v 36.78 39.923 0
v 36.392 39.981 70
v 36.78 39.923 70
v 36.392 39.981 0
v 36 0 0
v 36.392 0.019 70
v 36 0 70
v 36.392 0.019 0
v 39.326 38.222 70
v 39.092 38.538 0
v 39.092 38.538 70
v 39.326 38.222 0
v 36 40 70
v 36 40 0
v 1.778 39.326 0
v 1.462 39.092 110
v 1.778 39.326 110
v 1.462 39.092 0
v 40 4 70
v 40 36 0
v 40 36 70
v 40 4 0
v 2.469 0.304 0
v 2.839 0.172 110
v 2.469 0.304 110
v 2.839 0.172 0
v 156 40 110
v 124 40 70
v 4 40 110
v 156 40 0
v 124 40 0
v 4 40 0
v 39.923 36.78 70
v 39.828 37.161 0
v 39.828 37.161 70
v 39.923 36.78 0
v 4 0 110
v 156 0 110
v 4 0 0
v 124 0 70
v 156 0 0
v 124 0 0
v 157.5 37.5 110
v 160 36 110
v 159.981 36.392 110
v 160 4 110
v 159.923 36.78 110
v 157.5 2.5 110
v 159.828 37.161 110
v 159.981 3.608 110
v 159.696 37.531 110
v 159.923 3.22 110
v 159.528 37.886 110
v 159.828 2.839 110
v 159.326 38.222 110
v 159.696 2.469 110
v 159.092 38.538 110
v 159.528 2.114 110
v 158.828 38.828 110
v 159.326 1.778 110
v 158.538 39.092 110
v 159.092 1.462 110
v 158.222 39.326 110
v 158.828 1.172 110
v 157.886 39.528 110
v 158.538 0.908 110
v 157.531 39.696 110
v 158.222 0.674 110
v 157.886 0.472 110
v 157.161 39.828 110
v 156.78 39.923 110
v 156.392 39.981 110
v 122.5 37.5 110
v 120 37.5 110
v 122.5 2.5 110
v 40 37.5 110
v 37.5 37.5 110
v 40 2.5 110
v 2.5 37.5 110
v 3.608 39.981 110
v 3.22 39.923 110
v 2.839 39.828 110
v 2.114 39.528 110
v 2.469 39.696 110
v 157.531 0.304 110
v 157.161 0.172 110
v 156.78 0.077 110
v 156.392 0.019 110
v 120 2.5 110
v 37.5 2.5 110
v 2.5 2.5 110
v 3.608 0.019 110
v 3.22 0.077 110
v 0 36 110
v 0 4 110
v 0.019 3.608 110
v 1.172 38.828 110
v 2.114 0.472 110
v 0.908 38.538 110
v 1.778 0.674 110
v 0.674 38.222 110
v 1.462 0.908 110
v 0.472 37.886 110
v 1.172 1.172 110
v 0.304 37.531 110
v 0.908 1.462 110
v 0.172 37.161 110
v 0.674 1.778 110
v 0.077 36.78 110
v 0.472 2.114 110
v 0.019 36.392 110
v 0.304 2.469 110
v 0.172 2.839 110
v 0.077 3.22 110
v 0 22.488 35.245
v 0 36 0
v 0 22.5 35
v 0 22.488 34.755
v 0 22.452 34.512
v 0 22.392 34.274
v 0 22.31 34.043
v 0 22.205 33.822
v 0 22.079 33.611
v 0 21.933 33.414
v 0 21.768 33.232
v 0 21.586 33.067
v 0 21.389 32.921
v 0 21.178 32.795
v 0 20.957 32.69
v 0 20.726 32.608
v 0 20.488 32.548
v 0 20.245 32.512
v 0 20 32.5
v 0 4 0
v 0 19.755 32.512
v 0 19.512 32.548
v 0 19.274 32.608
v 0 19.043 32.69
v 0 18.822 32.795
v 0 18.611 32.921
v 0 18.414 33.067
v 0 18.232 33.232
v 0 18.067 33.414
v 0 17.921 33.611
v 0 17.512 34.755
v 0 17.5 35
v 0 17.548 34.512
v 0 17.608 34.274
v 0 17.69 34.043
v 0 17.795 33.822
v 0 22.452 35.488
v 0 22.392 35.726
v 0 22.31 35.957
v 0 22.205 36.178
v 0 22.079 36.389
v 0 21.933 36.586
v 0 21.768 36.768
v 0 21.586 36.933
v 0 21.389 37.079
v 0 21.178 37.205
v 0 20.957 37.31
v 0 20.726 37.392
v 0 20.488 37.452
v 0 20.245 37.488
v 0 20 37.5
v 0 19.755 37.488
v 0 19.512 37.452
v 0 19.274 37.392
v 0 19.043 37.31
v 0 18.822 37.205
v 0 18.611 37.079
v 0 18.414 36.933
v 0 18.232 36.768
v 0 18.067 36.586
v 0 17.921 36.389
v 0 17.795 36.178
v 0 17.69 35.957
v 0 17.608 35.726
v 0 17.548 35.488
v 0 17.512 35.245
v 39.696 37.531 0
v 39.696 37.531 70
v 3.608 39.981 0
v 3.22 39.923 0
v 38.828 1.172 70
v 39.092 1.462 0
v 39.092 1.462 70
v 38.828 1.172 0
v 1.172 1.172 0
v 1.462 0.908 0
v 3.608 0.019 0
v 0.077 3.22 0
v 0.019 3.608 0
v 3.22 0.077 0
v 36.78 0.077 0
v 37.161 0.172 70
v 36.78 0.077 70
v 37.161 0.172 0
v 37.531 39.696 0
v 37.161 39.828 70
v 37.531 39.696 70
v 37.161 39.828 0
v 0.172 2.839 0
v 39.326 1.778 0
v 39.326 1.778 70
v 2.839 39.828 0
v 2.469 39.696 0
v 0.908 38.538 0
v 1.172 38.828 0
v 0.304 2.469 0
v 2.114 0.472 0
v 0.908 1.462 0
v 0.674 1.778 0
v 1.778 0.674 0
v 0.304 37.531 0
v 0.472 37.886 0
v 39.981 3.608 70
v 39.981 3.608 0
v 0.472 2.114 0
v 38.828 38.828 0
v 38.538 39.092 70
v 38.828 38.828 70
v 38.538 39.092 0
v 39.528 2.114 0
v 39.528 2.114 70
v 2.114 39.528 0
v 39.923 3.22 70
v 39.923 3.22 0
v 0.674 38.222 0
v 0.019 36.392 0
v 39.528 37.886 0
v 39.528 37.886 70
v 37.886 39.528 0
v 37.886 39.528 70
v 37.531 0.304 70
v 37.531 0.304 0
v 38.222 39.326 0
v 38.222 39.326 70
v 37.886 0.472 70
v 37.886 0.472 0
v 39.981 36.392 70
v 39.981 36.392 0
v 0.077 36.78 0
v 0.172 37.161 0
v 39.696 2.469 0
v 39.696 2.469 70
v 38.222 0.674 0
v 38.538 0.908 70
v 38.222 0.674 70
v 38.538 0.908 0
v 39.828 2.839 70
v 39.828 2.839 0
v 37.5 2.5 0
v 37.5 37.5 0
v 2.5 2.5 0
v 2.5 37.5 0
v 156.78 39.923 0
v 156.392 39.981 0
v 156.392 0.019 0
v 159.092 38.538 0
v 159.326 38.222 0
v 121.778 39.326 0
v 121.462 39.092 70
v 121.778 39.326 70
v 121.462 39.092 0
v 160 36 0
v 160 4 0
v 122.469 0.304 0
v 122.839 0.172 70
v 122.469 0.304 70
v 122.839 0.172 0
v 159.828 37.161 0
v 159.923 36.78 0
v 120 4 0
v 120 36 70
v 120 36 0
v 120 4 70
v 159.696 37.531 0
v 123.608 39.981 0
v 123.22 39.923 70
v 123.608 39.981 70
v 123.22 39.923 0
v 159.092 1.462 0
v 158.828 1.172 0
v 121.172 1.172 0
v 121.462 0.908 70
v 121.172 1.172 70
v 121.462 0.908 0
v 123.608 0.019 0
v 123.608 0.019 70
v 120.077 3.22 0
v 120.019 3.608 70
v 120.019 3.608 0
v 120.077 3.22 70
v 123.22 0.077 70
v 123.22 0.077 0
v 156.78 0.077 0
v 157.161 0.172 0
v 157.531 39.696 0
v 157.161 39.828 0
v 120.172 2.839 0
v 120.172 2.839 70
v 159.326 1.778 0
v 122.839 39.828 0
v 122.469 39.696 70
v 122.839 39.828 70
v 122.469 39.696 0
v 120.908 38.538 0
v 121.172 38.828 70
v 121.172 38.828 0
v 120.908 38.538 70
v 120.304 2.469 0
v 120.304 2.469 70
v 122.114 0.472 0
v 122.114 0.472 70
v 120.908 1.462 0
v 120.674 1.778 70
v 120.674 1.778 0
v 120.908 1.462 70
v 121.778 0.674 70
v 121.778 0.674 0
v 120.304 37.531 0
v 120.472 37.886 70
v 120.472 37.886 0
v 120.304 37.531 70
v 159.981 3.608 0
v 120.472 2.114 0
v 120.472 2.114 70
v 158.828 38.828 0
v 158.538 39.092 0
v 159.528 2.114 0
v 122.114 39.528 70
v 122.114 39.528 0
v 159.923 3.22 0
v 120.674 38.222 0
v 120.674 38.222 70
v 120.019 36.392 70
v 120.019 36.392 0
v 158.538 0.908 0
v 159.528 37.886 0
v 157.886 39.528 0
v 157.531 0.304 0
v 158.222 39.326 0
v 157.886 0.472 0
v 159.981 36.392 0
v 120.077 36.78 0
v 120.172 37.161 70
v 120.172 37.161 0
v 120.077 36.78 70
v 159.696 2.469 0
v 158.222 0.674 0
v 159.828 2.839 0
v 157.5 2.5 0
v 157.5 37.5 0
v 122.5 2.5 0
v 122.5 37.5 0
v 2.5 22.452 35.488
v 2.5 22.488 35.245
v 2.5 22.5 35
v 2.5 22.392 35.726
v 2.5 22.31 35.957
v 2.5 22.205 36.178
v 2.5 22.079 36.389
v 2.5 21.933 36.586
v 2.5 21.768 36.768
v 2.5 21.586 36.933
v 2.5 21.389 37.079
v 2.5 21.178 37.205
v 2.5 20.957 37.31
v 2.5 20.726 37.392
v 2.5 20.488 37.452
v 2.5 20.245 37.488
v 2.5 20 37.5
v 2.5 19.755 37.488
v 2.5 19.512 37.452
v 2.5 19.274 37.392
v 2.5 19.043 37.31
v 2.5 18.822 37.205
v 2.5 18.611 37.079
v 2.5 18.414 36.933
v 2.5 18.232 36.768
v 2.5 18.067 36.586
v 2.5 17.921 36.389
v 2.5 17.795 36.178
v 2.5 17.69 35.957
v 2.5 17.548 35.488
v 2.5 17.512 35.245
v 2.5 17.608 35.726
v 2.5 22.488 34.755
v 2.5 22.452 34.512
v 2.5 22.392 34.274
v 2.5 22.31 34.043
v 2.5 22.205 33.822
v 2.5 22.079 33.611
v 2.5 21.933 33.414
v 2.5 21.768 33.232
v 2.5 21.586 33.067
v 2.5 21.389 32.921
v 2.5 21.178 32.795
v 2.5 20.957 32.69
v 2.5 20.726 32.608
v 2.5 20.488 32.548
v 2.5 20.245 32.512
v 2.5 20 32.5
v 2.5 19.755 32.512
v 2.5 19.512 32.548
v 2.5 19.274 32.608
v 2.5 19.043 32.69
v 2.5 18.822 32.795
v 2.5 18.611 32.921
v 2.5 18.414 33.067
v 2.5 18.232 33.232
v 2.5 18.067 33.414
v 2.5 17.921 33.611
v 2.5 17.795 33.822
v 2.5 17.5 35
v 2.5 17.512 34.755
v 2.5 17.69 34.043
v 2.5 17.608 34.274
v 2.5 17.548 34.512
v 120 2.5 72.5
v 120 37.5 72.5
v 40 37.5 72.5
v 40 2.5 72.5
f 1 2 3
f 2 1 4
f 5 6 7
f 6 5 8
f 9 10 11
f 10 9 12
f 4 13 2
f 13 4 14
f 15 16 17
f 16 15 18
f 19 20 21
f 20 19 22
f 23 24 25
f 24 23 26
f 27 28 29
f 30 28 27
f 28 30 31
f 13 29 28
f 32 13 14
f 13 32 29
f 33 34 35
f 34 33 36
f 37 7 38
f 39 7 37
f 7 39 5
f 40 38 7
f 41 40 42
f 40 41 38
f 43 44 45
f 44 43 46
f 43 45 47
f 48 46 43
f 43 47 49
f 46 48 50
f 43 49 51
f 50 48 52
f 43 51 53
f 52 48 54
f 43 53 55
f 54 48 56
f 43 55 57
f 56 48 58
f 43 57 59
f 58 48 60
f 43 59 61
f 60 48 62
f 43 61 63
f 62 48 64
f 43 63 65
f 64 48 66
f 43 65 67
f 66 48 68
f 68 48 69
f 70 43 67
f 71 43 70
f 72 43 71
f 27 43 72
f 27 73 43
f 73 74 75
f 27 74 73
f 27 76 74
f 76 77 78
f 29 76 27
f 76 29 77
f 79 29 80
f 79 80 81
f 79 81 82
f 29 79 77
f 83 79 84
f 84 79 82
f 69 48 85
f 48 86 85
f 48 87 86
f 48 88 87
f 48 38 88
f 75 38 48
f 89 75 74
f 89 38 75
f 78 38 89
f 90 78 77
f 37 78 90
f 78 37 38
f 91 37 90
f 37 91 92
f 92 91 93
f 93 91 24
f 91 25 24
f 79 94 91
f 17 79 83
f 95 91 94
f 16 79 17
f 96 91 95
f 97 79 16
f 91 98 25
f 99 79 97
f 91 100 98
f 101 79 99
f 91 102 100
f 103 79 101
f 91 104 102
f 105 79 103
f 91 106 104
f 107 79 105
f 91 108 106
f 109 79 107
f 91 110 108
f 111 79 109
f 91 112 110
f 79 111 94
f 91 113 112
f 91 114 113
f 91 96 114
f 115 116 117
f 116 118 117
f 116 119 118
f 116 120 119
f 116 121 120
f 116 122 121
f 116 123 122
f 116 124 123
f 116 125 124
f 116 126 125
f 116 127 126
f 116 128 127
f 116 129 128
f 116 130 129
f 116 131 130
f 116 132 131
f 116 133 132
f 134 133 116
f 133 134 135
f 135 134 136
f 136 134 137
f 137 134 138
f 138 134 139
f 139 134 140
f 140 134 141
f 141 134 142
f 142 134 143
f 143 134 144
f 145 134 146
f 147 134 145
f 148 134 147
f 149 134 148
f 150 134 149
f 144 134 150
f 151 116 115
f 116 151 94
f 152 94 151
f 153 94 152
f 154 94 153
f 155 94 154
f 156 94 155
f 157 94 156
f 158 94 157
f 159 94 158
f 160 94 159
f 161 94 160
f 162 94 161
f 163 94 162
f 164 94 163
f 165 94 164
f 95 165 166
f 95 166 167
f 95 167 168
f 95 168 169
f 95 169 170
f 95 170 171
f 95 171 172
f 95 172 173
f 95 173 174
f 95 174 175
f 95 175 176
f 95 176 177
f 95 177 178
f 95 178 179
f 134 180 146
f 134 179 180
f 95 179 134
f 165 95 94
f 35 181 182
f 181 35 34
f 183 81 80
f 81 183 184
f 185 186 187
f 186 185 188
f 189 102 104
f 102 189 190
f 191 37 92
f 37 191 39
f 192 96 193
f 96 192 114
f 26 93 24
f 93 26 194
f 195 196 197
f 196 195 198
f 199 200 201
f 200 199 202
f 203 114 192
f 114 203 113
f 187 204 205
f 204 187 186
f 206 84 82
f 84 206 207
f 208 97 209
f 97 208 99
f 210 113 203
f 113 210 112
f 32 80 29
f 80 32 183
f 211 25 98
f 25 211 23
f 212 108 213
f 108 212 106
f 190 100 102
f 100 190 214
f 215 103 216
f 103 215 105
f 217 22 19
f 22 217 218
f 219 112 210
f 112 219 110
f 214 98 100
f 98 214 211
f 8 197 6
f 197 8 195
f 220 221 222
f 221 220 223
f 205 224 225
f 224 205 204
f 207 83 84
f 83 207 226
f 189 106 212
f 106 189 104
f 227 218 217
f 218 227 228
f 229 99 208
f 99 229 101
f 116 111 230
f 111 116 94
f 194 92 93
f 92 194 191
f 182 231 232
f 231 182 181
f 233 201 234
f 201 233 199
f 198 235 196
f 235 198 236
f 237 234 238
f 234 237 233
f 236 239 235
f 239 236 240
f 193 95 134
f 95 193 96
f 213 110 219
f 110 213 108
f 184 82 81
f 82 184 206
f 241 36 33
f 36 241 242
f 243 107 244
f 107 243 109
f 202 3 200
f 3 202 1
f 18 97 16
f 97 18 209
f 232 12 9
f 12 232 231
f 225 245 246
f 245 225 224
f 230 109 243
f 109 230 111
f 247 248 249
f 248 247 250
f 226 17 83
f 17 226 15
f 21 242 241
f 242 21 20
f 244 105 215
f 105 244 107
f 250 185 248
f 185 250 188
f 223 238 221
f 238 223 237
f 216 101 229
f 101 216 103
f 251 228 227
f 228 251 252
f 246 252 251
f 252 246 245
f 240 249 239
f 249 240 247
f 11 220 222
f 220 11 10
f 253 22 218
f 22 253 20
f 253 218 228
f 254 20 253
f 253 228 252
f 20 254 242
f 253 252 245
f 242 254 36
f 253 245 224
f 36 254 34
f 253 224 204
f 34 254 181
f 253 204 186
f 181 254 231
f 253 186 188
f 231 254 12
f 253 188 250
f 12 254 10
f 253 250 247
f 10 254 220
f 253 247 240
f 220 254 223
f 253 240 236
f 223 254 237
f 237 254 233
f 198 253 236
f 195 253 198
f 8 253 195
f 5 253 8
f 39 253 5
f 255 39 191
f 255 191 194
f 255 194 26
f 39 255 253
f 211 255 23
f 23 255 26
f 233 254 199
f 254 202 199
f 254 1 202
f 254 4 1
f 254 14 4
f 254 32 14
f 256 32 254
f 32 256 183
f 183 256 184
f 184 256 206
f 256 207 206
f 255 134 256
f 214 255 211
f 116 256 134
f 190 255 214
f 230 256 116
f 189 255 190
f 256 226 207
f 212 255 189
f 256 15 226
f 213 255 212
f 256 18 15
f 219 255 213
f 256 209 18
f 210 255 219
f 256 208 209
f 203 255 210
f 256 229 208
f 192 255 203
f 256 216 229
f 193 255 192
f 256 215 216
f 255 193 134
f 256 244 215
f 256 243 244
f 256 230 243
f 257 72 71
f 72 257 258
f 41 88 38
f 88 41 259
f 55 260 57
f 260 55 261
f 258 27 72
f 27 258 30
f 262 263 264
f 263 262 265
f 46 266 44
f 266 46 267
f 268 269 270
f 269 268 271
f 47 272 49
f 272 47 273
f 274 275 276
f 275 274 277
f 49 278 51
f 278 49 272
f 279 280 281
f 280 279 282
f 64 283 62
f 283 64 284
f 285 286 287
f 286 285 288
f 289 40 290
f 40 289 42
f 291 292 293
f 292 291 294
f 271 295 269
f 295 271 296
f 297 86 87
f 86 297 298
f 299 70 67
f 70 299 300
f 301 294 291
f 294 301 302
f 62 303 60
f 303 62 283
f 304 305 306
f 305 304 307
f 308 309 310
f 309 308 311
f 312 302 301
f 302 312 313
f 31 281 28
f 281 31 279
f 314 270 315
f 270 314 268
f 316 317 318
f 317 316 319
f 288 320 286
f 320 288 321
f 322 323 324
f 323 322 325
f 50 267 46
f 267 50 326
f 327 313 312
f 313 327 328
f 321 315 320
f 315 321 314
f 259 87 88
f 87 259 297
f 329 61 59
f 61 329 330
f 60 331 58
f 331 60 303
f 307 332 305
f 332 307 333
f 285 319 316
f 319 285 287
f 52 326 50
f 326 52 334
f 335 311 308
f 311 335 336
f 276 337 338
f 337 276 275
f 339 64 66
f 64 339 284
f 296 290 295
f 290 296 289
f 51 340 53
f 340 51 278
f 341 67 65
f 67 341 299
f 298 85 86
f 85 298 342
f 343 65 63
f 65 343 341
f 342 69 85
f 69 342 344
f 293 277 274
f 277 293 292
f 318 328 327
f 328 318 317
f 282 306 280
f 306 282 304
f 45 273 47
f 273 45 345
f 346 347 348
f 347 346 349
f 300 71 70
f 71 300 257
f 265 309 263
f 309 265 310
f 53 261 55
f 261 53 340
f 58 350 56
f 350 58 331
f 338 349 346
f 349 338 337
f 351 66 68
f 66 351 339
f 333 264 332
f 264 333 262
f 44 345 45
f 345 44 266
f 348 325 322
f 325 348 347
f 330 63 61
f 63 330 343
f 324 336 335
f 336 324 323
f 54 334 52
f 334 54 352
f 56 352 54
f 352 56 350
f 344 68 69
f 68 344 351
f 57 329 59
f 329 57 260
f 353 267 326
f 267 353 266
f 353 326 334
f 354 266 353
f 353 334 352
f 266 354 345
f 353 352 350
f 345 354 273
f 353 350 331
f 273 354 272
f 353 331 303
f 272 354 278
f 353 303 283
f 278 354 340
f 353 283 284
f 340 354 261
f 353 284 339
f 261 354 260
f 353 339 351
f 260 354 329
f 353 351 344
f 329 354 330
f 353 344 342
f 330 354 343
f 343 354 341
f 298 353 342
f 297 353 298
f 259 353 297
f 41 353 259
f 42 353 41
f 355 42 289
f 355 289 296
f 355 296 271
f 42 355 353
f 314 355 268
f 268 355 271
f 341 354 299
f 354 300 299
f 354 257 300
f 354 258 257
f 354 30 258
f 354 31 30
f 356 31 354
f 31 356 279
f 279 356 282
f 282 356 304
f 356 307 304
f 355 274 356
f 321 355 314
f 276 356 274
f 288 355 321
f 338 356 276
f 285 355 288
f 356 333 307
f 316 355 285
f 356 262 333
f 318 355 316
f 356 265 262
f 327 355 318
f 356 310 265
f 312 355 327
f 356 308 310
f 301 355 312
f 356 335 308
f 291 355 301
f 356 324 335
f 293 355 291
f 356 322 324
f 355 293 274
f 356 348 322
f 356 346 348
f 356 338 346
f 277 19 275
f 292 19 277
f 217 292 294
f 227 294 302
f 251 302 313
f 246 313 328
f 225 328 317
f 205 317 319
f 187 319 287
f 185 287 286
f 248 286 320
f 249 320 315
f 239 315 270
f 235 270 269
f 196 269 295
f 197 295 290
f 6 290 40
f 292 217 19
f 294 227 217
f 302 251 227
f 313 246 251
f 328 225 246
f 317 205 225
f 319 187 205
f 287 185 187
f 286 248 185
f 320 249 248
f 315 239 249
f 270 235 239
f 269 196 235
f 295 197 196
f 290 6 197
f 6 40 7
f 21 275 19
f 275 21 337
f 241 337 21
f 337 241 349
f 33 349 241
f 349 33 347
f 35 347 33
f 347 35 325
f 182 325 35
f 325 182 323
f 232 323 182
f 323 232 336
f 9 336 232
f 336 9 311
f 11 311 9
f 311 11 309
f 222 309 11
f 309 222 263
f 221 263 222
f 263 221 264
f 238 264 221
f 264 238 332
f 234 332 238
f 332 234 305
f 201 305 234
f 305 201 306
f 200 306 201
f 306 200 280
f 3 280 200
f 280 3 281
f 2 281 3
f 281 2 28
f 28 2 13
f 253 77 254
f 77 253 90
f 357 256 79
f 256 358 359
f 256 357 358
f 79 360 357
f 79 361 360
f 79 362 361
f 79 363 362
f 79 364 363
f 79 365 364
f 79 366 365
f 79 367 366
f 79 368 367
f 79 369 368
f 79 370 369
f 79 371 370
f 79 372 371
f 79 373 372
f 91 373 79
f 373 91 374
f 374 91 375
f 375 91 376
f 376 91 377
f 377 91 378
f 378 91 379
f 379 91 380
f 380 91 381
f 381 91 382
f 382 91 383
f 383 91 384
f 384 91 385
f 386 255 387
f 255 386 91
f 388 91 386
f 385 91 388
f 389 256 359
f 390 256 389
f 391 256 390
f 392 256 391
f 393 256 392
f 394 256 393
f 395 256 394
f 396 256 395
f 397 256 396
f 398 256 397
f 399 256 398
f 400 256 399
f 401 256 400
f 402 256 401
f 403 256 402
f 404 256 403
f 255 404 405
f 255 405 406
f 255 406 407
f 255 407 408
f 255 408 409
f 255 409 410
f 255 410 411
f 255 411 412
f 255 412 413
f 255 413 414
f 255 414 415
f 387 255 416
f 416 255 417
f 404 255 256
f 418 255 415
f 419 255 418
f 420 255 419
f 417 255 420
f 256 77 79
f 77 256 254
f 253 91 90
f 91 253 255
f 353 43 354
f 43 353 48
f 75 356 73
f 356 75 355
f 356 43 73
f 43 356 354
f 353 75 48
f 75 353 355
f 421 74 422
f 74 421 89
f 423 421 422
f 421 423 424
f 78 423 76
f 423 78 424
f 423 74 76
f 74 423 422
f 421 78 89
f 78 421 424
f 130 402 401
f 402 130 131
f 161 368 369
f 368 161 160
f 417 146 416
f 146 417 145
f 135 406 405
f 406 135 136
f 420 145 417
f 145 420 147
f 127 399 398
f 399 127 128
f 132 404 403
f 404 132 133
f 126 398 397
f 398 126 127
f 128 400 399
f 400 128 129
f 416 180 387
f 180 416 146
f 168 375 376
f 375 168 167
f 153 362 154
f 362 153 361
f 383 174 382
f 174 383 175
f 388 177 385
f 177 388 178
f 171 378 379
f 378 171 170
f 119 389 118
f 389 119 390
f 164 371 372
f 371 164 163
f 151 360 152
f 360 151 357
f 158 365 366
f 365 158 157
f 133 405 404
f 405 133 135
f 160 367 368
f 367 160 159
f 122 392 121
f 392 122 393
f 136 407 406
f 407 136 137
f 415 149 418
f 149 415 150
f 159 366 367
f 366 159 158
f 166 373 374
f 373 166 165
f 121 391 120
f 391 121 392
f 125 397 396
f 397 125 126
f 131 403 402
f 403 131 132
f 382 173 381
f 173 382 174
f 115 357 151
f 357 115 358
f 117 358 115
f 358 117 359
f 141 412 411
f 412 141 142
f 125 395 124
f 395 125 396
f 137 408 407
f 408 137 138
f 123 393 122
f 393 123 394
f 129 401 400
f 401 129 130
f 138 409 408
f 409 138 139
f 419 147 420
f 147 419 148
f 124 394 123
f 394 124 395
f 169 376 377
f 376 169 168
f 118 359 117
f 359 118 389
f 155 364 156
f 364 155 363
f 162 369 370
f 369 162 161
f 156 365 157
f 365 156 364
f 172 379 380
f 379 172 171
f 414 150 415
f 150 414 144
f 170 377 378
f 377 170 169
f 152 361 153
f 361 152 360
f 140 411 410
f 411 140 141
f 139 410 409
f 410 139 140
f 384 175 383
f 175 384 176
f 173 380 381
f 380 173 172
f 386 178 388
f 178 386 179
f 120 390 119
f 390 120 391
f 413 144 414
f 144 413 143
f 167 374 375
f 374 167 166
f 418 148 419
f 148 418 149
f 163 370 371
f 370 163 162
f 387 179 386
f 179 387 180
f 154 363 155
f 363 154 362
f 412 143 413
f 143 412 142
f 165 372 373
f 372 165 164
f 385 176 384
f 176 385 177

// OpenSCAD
// file: params.scad
// Cat Feeder 5000 — Shared Parameters & Common Modules
// Include this file first in all part files: include <params.scad>

// ===== DIMENSIONS =====
WALL = 3;                // Standard wall thickness (mm)
THIN_WALL = 2.5;         // Thin walls (antenna arch, etc.)
FLOOR = 4;               // Base floor thickness
INSERT_BORE = 4.7;       // M3 heat-set insert pocket bore
M3_CLEAR = 3.4;          // M3 clearance hole
UNIT_W = 160;            // Main body width
UNIT_D = 240;            // Main body depth
UNIT_H = 160;            // Main body height
GATE_W = 118;            // Gate flap width
GATE_H = 90;             // Gate flap height
GATE_T = 3;              // Gate flap thickness
GATE_ROD_D = 3.2;        // Gate hinge rod diameter
ARCH_SPAN = 160;         // Antenna arch left-to-right span
ARCH_H = 70;             // Antenna arch height
ARCH_D = 40;             // Antenna arch depth (front-to-back)
COIL_CH_W = 16;          // Coil channel width
COIL_CH_D = 5;           // Coil channel depth
SERVO_W = 23;            // SG90 servo width
SERVO_D = 12.5;          // SG90 servo depth
SERVO_H = 30;            // SG90 servo height
SERVO_EAR_SPAN = 28;     // SG90 servo ear spacing
TOLERANCE = 0.1;         // General fit tolerance

// ===== RENDER QUALITY =====
$fn = 64;                // Circle resolution (smooth curves)

// ===== COLORS =====
COL_RFID = [0.8, 0.2, 0.2, 0.8];      // Red — RFID antenna arch
COL_TPU = [0.4, 0.7, 0.3, 0.8];       // Green — TPU flexible parts
COL_GATE = [0.2, 0.5, 0.8, 0.8];      // Blue — Gate mechanism
COL_BODY = [0.6, 0.6, 0.6, 0.8];      // Gray — Main body structure

// ===== COMMON MODULES =====

// M3 heat-set insert pocket (bore hole for pressed insert)
module m3_insert(h = 8) {
    cylinder(d = INSERT_BORE, h = h);
}

// M3 clearance hole (for bolt pass-through)
module m3_clear(h = 8) {
    cylinder(d = M3_CLEAR, h = h);
}

// Fillet box: rectangular box with filleted corners
// w, d, h = width, depth, height; r = corner radius
module fillet_box(w, d, h, r = 2) {
    hull() {
        translate([r, r, 0])
            cylinder(r = r, h = h);
        translate([w - r, r, 0])
            cylinder(r = r, h = h);
        translate([r, d - r, 0])
            cylinder(r = r, h = h);
        translate([w - r, d - r, 0])
            cylinder(r = r, h = h);
    }
}

// Boss: raised circular pad with M3 pocket
// Useful for internal reinforcement at bolt points
module boss(d = 10, h = 4, pocket = true) {
    difference() {
        cylinder(d = d, h = h);
        if (pocket)
            translate([0, 0, -0.1])
                m3_clear(h = h + 0.2);
    }
}
// main file
// Cat Feeder 5000 — Part 15: Antenna Arch Housing
// Overhead arch holding flat RFID coil. Coil channel is open-top (no bridging).
// Antenna reads cat's implanted FDX-B chip as cat's shoulders pass below.
// Print: PETG, 0.2mm layers, 25% infill, no supports. Print UPRIGHT.

include <params.scad>

color(COL_RFID) antenna_arch();

module antenna_arch() {
    SPAN   = ARCH_SPAN;    // 160mm
    AH     = ARCH_H;       // 70mm height of arch above base
    AD     = ARCH_D;       // 40mm depth
    WT     = THIN_WALL;    // 2.5mm wall
    CCW    = COIL_CH_W;    // 16mm coil channel width
    CCD    = COIL_CH_D;    // 5mm coil channel depth
    CABLE_D = 5;           // Antenna cable channel diameter

    difference() {
        union() {
            // Left leg
            translate([0, 0, 0])
                fillet_box(AD, AD, AH + AD, r=4);
            // Right leg
            translate([SPAN - AD, 0, 0])
                fillet_box(AD, AD, AH + AD, r=4);
            // Top arch bridge
            translate([0, 0, AH])
                fillet_box(SPAN, AD, AD, r=4);
        }

        // Hollow legs
        translate([WT, WT, -0.1])
            cube([AD - 2*WT, AD - 2*WT, AH + AD + 0.2]);
        translate([SPAN - AD + WT, WT, -0.1])
            cube([AD - 2*WT, AD - 2*WT, AH + AD + 0.2]);

        // Hollow bridge interior
        translate([AD, WT, AH + WT])
            cube([SPAN - 2*AD, AD - 2*WT, AD]);

        // Coil channel (open top — no perimeters over this in slicer)
        // Centered horizontally and front-to-back in top bridge
        translate([SPAN/2 - CCW/2, (AD - CCW)/2, AH + AD - CCD])
            cube([CCW, CCW, CCD + 0.1]);

        // Antenna cable channel through left leg wall
        translate([-0.1, AD/2, AH/2])
            rotate([0, 90, 0])
                cylinder(d=CABLE_D, h=WT + 0.2);

        // Body mount holes — 2× M3 insert per leg base
        for (x = [AD/2 - 8, AD/2 + 8])
            translate([x, AD/2, -0.1]) m3_clear(h=8);
        for (x = [SPAN - AD/2 - 8, SPAN - AD/2 + 8])
            translate([x, AD/2, -0.1]) m3_clear(h=8);
    }
}
